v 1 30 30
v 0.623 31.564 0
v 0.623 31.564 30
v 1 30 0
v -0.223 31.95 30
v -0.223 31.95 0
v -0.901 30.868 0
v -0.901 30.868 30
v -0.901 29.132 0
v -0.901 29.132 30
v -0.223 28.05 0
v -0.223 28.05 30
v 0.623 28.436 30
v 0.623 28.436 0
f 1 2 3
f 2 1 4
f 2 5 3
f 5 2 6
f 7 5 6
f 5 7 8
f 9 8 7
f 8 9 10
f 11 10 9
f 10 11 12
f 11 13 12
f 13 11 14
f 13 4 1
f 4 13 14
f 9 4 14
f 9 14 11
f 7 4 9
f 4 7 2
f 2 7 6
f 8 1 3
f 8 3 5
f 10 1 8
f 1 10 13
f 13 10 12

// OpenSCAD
// Generated by generate_scads.py
translate([0,30,0]) {
  scale([0.5,1.0,1.5]) {
    cylinder(h=20, r=2, center=false);
  }
}
